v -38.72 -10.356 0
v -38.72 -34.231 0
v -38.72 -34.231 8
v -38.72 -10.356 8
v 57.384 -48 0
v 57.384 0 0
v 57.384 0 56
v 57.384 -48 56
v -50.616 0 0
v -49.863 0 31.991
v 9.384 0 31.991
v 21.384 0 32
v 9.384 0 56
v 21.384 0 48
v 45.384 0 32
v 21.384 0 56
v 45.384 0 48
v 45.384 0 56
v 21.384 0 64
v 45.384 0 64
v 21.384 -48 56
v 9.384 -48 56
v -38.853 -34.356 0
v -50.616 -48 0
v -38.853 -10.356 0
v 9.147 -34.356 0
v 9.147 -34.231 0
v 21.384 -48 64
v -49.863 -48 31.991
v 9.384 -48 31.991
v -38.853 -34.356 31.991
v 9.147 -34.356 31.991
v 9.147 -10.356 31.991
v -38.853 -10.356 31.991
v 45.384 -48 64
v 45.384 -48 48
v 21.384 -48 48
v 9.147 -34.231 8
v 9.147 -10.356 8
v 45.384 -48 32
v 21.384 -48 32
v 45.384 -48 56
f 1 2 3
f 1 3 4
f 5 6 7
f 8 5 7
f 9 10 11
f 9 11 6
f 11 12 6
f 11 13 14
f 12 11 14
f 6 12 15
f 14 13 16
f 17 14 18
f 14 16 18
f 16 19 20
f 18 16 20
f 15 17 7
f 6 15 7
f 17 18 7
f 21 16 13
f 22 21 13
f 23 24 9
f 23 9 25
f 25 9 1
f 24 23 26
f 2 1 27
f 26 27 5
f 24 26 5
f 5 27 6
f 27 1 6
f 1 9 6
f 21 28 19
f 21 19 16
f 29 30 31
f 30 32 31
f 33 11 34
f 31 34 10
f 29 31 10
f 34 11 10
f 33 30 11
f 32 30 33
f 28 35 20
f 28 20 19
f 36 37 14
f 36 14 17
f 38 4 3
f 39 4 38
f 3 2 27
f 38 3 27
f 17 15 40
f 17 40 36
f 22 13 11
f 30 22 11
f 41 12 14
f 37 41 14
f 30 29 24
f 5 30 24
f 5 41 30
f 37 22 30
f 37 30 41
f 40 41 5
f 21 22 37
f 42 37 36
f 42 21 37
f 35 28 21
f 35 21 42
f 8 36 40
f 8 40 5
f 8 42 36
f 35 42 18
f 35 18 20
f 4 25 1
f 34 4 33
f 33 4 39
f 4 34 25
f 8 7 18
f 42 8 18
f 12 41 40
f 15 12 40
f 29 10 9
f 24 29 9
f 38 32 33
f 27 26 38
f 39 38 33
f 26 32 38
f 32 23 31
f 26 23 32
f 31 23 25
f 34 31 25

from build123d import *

# Parameters (mm, degrees)
F0_W     = 24
F0_H     = 16
F1_DEPTH = 48
F2_W     = 48
F2_H     = 24
F3_DEPTH = 31.991146
F4_W     = 48
F4_H     = 24
F5_DEPTH = 8


with BuildPart() as f1:
    # F0 (on Front) → F1 (new body)
    with BuildSketch(Plane.XZ):
        Polygon((-49.863074, 31.991146), (-50.615804, 0), (57.384196, 0), (57.384196, 56), (45.384196, 56), (45.384196, 64), (21.384196, 64), (21.384196, 56), (9.384196, 56), (9.384196, 31.991146), align=None)
        with Locations((33.384196, 40)):
            Rectangle(F0_W, F0_H, mode=Mode.SUBTRACT)
    extrude(amount=F1_DEPTH)

    # F2 (on Top) → F3 (cut, through all)
    with BuildSketch(Plane.XY):
        with Locations((-14.853436, -22.356194)):
            Rectangle(F2_W, F2_H)
    extrude(amount=F3_DEPTH, mode=Mode.SUBTRACT)

    # F4 (on Top) → F5 (join)
    with BuildSketch(Plane.XY):
        with Locations((-14.719842, -22.231252)):
            Rectangle(F4_W, F4_H)
    extrude(amount=F5_DEPTH)


solid = f1.part
